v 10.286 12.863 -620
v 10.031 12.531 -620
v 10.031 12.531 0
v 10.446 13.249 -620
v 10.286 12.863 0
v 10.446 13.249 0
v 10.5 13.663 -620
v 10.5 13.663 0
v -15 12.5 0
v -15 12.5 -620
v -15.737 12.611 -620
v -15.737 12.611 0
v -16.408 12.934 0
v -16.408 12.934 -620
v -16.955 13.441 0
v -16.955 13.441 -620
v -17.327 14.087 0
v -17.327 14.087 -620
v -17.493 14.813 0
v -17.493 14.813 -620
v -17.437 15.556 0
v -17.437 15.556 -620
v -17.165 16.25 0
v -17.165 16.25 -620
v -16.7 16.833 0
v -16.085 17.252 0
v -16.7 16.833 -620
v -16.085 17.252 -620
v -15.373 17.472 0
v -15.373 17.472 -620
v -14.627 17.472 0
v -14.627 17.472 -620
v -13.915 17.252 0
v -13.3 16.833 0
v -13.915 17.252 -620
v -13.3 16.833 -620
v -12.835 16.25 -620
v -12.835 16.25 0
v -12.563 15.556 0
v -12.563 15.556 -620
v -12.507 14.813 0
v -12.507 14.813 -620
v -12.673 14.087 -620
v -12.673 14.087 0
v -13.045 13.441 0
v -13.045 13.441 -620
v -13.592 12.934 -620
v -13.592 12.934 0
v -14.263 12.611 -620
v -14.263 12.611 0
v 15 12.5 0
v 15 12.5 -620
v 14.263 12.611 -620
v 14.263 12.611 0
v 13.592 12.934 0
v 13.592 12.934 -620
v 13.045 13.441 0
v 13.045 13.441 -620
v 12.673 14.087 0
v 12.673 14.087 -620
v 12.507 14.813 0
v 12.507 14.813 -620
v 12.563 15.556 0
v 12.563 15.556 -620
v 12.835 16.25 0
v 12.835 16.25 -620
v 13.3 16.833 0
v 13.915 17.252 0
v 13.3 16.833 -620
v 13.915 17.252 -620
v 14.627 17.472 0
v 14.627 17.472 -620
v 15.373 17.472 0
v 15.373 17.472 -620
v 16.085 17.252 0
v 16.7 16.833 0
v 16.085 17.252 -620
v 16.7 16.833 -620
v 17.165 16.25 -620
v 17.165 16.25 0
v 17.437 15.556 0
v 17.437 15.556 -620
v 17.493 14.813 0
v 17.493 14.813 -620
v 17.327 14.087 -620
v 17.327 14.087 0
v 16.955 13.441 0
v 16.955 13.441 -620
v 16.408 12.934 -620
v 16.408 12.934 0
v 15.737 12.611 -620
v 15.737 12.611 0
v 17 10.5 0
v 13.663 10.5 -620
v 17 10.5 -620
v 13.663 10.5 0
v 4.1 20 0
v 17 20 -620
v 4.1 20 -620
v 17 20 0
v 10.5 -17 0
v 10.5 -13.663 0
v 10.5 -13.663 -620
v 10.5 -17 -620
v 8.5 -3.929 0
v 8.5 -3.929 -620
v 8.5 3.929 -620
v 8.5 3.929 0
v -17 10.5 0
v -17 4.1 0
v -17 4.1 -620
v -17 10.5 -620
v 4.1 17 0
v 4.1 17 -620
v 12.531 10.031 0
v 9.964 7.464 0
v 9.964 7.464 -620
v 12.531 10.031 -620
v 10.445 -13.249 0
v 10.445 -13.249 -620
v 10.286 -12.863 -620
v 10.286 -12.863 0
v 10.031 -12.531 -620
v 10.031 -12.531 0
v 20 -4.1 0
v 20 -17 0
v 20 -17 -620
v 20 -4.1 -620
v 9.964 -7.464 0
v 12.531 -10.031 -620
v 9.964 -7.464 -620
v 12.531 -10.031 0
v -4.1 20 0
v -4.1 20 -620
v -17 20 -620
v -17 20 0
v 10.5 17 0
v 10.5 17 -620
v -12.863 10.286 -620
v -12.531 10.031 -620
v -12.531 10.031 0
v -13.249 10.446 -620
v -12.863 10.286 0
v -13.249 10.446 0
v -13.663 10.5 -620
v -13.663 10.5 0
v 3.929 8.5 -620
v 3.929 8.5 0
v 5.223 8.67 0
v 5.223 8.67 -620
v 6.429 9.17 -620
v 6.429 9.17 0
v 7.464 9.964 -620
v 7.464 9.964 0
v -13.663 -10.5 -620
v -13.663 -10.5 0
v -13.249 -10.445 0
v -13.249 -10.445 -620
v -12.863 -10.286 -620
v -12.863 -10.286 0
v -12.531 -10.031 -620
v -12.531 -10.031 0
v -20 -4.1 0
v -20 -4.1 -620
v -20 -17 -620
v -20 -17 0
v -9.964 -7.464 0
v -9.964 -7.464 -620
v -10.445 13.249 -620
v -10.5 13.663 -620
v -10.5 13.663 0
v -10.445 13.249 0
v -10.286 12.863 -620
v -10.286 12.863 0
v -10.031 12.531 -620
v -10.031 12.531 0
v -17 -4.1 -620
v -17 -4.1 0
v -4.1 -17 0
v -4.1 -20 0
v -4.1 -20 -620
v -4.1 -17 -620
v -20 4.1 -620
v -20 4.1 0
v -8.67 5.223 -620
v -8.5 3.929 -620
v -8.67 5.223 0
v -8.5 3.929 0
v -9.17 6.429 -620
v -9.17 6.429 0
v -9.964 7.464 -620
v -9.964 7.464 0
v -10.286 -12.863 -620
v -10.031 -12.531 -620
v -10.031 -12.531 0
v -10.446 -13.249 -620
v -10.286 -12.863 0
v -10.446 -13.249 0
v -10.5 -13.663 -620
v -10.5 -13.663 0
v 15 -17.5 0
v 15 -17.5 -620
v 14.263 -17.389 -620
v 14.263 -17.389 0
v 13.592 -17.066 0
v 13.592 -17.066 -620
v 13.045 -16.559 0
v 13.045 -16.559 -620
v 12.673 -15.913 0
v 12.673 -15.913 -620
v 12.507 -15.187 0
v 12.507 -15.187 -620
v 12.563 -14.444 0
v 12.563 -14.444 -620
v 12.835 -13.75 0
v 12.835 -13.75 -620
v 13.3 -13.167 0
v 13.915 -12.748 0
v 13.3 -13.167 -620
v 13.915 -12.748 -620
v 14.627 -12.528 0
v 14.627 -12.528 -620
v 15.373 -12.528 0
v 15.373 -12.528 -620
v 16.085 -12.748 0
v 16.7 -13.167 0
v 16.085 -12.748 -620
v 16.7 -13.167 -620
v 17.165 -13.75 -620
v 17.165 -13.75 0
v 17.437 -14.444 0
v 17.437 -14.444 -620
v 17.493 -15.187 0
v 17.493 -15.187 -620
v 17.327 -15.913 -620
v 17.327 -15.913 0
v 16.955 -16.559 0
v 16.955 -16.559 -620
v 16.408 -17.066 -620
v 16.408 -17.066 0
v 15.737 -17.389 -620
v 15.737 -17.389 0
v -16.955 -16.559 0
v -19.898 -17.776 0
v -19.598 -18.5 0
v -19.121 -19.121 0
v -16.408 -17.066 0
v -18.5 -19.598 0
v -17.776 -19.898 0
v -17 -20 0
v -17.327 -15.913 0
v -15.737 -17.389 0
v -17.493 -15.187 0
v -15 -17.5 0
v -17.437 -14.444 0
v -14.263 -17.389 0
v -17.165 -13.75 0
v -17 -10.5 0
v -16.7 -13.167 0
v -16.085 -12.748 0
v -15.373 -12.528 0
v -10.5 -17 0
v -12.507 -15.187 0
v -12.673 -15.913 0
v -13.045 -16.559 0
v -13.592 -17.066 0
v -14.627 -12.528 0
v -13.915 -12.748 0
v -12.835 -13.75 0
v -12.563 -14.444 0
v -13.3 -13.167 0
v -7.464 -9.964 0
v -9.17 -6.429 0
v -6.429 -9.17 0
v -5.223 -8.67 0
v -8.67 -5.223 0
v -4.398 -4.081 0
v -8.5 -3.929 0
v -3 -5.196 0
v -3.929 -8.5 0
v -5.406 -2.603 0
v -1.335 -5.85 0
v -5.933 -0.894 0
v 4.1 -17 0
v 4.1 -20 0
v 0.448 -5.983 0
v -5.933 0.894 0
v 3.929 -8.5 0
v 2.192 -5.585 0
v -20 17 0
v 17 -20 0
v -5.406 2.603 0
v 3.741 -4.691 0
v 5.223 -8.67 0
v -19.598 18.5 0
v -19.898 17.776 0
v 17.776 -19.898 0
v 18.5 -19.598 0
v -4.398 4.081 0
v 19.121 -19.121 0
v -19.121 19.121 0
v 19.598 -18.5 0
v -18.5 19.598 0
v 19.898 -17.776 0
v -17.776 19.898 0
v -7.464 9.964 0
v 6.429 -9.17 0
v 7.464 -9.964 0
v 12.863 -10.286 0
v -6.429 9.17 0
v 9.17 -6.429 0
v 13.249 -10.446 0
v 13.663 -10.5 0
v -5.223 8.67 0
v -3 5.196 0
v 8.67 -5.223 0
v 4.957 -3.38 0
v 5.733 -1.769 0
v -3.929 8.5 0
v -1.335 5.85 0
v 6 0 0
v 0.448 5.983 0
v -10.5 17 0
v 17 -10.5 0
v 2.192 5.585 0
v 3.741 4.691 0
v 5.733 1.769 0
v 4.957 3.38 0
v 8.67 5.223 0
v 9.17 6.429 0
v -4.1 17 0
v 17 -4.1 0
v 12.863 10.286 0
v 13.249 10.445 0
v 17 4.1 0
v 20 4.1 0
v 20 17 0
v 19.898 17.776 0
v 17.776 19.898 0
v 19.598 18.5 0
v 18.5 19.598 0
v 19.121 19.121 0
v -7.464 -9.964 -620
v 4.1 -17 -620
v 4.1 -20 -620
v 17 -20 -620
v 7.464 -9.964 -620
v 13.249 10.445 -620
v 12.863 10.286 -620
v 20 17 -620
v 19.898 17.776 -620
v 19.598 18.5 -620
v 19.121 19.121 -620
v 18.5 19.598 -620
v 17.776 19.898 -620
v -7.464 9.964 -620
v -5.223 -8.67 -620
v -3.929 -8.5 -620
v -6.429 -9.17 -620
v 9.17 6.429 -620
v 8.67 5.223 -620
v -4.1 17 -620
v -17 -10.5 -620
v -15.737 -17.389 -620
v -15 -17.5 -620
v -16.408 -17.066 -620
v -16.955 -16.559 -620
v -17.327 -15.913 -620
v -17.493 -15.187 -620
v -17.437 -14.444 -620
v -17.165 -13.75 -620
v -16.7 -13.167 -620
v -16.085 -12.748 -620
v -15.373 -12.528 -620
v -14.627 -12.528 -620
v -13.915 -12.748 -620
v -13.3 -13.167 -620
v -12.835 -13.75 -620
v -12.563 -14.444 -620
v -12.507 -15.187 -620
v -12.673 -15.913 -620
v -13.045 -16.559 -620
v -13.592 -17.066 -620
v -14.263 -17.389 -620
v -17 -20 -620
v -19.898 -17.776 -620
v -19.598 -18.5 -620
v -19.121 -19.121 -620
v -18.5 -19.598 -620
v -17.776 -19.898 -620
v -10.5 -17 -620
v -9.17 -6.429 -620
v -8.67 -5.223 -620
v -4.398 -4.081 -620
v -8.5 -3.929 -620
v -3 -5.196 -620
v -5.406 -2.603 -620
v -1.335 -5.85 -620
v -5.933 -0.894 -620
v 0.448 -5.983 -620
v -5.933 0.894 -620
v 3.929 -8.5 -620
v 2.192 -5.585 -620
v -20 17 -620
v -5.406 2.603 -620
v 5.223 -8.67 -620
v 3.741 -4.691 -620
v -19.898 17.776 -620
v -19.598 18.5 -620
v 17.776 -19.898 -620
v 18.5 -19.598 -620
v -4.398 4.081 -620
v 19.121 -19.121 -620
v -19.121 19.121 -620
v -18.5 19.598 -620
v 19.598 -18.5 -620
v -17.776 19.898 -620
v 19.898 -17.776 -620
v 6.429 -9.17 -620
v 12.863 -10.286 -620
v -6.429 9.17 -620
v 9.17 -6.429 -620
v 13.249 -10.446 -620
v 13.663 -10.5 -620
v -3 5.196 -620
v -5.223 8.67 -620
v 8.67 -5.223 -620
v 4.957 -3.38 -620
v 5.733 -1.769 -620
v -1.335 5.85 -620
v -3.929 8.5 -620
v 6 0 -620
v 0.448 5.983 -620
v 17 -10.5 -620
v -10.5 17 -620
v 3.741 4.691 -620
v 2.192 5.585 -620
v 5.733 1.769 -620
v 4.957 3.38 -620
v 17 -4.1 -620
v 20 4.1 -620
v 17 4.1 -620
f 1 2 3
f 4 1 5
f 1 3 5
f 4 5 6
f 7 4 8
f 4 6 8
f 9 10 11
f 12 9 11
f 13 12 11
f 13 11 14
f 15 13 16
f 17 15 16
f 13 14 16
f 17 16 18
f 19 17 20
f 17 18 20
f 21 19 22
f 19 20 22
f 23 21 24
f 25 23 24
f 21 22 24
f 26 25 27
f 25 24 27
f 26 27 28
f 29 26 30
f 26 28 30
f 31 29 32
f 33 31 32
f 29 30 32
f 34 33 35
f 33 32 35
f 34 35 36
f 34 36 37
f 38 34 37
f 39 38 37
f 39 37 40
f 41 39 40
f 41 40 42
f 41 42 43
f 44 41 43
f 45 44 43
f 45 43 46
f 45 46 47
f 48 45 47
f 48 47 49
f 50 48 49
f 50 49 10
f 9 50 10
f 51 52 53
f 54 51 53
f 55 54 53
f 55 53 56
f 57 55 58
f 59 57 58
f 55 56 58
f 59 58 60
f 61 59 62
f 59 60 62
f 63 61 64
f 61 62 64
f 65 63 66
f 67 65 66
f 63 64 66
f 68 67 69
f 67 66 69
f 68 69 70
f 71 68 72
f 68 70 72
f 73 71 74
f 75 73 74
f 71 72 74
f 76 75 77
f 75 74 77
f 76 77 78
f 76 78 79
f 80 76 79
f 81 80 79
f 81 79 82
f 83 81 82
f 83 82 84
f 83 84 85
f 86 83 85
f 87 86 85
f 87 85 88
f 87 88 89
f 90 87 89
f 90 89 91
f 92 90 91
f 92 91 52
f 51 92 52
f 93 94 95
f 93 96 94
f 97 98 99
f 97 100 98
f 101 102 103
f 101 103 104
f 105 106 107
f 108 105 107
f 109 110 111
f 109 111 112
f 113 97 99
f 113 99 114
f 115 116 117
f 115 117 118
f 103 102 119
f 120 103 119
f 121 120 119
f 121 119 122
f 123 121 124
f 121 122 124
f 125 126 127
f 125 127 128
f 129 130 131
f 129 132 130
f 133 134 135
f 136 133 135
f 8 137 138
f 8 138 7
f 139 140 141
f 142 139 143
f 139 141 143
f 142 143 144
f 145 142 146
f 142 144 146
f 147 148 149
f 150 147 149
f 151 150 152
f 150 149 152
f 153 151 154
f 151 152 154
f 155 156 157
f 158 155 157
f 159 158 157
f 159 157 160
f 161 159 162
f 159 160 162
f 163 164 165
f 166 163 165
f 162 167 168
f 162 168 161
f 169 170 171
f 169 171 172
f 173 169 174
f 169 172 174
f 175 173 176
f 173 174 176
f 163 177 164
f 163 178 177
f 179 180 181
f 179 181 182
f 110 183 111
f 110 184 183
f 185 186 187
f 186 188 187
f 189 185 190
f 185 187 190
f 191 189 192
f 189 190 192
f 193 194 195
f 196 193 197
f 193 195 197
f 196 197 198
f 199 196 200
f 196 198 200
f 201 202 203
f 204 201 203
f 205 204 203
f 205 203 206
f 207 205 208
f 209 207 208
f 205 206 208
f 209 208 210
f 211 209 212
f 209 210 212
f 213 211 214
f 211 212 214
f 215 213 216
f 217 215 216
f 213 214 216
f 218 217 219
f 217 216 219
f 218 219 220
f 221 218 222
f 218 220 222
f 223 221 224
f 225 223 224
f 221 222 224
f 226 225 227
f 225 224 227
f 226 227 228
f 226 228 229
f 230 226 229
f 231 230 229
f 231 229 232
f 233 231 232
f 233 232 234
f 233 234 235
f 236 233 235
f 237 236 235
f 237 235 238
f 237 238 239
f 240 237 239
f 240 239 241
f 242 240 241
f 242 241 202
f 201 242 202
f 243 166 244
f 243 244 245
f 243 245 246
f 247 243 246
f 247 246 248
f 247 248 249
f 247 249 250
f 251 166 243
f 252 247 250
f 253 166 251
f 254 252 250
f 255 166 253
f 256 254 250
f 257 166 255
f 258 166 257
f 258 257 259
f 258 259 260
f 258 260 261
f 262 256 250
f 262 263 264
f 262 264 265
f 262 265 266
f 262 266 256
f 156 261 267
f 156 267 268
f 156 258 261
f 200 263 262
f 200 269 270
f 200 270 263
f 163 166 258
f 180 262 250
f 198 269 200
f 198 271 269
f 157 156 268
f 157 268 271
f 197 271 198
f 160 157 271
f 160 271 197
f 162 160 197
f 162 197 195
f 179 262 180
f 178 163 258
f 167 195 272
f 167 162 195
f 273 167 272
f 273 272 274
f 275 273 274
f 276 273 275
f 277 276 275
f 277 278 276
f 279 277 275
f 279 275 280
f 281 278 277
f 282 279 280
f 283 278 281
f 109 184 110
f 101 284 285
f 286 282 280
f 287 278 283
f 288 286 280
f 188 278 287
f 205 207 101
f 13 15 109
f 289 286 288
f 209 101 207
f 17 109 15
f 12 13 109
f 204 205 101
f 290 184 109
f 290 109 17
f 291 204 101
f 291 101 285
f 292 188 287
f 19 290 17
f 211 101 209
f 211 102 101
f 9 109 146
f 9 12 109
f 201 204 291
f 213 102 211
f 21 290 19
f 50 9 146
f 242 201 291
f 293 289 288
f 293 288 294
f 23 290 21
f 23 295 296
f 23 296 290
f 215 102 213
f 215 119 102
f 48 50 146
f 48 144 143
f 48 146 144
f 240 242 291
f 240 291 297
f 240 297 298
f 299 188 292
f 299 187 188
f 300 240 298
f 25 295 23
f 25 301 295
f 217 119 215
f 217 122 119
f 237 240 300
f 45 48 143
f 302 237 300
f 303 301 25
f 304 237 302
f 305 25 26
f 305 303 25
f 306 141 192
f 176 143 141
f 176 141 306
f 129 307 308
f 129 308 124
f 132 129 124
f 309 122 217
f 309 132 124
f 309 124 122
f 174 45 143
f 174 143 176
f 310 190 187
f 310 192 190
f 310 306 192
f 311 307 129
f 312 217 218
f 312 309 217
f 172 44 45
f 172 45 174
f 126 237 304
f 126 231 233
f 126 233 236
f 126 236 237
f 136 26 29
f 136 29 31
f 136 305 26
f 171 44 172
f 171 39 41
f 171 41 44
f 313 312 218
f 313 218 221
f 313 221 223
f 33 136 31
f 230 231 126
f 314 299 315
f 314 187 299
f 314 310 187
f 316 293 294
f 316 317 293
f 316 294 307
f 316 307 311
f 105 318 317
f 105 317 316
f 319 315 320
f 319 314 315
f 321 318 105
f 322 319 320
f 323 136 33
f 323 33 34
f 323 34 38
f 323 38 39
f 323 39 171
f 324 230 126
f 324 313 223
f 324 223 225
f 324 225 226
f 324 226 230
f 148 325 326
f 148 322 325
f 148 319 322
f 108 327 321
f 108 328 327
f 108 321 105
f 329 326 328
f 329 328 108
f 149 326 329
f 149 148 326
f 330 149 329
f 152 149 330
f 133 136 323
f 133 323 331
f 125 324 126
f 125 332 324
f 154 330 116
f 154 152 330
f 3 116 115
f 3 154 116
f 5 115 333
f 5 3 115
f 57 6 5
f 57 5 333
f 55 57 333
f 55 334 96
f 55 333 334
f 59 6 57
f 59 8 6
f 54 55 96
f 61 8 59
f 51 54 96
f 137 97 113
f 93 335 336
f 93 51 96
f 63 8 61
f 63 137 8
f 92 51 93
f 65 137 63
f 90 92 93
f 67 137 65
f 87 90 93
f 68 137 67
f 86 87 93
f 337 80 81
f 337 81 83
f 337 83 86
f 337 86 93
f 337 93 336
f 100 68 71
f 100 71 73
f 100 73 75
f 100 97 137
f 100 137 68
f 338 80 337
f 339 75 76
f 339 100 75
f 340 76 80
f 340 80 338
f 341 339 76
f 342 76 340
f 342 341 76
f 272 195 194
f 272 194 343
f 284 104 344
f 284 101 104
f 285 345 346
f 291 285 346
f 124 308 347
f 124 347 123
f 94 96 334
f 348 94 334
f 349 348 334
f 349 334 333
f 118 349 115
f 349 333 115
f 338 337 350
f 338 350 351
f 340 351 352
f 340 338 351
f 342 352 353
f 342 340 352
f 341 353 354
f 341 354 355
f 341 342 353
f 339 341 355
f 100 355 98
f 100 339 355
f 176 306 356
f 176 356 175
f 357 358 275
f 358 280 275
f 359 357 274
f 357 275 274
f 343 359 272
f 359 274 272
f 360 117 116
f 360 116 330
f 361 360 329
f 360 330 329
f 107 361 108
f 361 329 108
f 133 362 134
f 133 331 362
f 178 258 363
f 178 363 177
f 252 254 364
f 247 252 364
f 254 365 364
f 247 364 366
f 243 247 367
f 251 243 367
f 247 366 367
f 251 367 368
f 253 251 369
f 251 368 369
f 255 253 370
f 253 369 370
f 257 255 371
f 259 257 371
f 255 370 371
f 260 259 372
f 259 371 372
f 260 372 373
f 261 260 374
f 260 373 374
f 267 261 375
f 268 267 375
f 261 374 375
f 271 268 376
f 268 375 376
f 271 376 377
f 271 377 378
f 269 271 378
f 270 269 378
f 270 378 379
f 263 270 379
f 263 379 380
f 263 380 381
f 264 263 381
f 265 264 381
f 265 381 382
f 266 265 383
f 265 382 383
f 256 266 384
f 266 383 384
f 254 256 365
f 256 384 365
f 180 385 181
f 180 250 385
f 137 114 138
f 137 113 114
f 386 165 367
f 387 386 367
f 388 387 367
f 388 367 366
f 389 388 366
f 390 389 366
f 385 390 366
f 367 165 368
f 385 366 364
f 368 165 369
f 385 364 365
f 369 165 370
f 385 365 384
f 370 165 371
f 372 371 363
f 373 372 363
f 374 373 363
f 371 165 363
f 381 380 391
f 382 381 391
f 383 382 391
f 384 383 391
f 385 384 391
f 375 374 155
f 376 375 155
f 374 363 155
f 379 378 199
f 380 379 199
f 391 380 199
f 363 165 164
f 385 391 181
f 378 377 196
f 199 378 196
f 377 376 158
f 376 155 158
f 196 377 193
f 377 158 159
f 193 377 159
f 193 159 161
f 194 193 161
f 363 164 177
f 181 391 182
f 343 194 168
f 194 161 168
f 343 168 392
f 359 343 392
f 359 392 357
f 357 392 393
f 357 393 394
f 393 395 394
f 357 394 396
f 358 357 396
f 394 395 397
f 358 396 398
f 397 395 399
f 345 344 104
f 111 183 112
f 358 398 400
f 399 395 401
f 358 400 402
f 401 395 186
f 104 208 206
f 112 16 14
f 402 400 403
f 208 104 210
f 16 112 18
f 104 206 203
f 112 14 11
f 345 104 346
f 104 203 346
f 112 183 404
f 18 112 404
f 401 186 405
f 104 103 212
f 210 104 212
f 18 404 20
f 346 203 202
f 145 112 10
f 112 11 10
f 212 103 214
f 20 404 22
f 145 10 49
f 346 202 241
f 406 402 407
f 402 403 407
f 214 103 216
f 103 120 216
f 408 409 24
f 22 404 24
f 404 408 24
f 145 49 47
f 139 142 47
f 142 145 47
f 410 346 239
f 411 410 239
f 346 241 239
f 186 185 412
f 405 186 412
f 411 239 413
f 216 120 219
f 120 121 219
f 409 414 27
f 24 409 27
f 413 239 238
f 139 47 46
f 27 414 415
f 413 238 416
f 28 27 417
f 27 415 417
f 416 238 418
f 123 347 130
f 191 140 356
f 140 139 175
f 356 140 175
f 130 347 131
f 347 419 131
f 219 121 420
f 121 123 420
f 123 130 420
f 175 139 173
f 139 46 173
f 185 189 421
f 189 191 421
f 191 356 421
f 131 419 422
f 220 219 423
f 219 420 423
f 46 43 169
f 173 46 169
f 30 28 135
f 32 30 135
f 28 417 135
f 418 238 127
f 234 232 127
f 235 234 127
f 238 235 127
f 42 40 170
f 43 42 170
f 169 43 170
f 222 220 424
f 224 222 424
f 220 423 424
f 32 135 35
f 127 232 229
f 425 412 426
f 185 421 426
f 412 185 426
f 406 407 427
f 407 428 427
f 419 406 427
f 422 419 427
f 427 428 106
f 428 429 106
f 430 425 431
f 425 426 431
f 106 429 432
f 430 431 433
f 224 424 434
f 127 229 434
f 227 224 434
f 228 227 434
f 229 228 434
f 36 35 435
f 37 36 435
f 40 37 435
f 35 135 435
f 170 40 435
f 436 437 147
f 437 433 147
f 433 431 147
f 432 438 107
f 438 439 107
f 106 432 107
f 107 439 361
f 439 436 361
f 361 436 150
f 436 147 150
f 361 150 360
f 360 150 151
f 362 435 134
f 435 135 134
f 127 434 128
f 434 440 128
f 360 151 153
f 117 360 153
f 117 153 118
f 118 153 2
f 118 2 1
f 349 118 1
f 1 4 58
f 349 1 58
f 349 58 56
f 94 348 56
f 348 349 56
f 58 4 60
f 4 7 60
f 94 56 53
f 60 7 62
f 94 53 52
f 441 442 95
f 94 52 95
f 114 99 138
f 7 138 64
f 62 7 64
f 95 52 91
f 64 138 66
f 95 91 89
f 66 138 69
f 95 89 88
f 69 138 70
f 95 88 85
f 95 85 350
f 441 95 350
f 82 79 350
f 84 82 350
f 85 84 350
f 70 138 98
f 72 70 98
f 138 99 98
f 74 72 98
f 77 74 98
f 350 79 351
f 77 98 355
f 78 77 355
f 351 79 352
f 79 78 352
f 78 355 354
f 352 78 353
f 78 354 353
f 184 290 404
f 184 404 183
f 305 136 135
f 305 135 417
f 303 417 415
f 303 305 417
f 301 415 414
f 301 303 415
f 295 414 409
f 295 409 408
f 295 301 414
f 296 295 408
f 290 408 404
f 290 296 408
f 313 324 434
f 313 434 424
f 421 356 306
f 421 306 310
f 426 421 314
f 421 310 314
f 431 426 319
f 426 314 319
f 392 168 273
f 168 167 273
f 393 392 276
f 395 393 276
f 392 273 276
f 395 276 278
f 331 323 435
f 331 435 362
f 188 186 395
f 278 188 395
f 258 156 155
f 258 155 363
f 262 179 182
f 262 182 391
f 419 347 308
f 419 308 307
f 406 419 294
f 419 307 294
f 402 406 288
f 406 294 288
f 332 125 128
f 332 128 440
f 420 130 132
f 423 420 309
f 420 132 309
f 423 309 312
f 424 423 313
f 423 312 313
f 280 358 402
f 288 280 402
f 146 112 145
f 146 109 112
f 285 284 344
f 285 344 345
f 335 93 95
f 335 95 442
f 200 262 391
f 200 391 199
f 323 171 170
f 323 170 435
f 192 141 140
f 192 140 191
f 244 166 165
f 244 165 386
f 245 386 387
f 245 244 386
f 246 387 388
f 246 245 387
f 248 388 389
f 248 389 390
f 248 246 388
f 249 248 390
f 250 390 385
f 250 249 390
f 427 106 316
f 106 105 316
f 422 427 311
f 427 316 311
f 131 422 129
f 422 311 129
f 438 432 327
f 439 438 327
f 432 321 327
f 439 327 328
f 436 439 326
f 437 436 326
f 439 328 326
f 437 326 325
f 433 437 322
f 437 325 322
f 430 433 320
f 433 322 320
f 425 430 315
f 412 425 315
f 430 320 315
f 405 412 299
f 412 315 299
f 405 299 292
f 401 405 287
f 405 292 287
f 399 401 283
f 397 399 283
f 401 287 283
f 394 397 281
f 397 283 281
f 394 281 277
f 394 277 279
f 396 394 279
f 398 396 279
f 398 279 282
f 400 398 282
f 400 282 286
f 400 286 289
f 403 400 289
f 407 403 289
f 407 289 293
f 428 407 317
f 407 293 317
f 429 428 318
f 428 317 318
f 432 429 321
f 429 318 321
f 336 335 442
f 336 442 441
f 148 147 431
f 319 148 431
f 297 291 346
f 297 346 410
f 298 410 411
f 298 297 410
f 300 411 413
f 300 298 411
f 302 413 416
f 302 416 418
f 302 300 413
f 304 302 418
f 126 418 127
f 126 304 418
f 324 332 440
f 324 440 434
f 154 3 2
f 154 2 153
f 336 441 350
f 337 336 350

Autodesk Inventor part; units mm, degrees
sketch "Skizze_1" plane through (0, 0, 0) normal (0, 0, 1) x (1, 0, 0)
  arc A0 (-20, -17) -> (-17, -20) centre (-17, -17) ccw
  line L0 (-17, -20) -> (-4.1, -20)
  line L1 (-4.1, -20) -> (-4.1, -17)
  line L2 (-4.1, -17) -> (-10.5, -17)
  line L3 (-10.5, -17) -> (-10.5, -13.6627)
  arc A1 (-10.0314, -12.5314) -> (-10.5, -13.6627) centre (-8.9002, -13.6627) ccw
  line L4 (-10.0314, -12.5314) -> (-7.4645, -9.9645)
  arc A2 (-3.9289, -8.5) -> (-7.4645, -9.9645) centre (-3.9289, -13.5) ccw
  line L5 (-3.9289, -8.5) -> (3.9289, -8.5)
  arc A3 (7.4645, -9.9645) -> (3.9289, -8.5) centre (3.9289, -13.5) ccw
  line L6 (7.4645, -9.9645) -> (10.0314, -12.5314)
  arc A4 (10.5, -13.6627) -> (10.0314, -12.5314) centre (8.9002, -13.6627) ccw
  line L7 (10.5, -13.6627) -> (10.5, -17)
  line L8 (10.5, -17) -> (4.1, -17)
  line L9 (4.1, -17) -> (4.1, -20)
  line L10 (4.1, -20) -> (17, -20)
  arc A5 (17, -20) -> (20, -17) centre (17, -17) ccw
  line L11 (20, -17) -> (20, -4.1)
  line L12 (20, -4.1) -> (17, -4.1)
  line L13 (17, -4.1) -> (17, -10.5)
  line L14 (17, -10.5) -> (13.6627, -10.5)
  arc A6 (12.5314, -10.0314) -> (13.6627, -10.5) centre (13.6627, -8.9002) ccw
  line L15 (12.5314, -10.0314) -> (9.9645, -7.4645)
  arc A7 (8.5, -3.9289) -> (9.9645, -7.4645) centre (13.5, -3.9289) ccw
  line L16 (8.5, -3.9289) -> (8.5, 3.9289)
  arc A8 (9.9645, 7.4645) -> (8.5, 3.9289) centre (13.5, 3.9289) ccw
  line L17 (9.9645, 7.4645) -> (12.5314, 10.0314)
  arc A9 (13.6627, 10.5) -> (12.5314, 10.0314) centre (13.6627, 8.9002) ccw
  line L18 (13.6627, 10.5) -> (17, 10.5)
  line L19 (17, 10.5) -> (17, 4.1)
  line L20 (17, 4.1) -> (20, 4.1)
  line L21 (20, 4.1) -> (20, 17)
  arc A10 (20, 17) -> (17, 20) centre (17, 17) ccw
  line L22 (17, 20) -> (4.1, 20)
  line L23 (4.1, 20) -> (4.1, 17)
  line L24 (4.1, 17) -> (10.5, 17)
  line L25 (10.5, 17) -> (10.5, 13.6627)
  arc A11 (10.0314, 12.5314) -> (10.5, 13.6627) centre (8.9002, 13.6627) ccw
  line L26 (10.0314, 12.5314) -> (7.4645, 9.9645)
  arc A12 (3.9289, 8.5) -> (7.4645, 9.9645) centre (3.9289, 13.5) ccw
  line L27 (3.9289, 8.5) -> (-3.9289, 8.5)
  arc A13 (-7.4645, 9.9645) -> (-3.9289, 8.5) centre (-3.9289, 13.5) ccw
  line L28 (-7.4645, 9.9645) -> (-10.0314, 12.5314)
  arc A14 (-10.5, 13.6627) -> (-10.0314, 12.5314) centre (-8.9002, 13.6627) ccw
  line L29 (-10.5, 13.6627) -> (-10.5, 17)
  line L30 (-10.5, 17) -> (-4.1, 17)
  line L31 (-4.1, 17) -> (-4.1, 20)
  line L32 (-4.1, 20) -> (-17, 20)
  arc A15 (-17, 20) -> (-20, 17) centre (-17, 17) ccw
  line L33 (-20, 17) -> (-20, 4.1)
  line L34 (-20, 4.1) -> (-17, 4.1)
  line L35 (-17, 4.1) -> (-17, 10.5)
  line L36 (-17, 10.5) -> (-13.6627, 10.5)
  arc A16 (-12.5314, 10.0314) -> (-13.6627, 10.5) centre (-13.6627, 8.9002) ccw
  line L37 (-12.5314, 10.0314) -> (-9.9645, 7.4645)
  arc A17 (-8.5, 3.9289) -> (-9.9645, 7.4645) centre (-13.5, 3.9289) ccw
  line L38 (-8.5, 3.9289) -> (-8.5, -3.9289)
  arc A18 (-9.9645, -7.4645) -> (-8.5, -3.9289) centre (-13.5, -3.9289) ccw
  line L39 (-9.9645, -7.4645) -> (-12.5314, -10.0314)
  arc A19 (-13.6627, -10.5) -> (-12.5314, -10.0314) centre (-13.6627, -8.9002) ccw
  line L40 (-13.6627, -10.5) -> (-17, -10.5)
  line L41 (-17, -10.5) -> (-17, -4.1)
  line L42 (-17, -4.1) -> (-20, -4.1)
  line L43 (-20, -4.1) -> (-20, -17)
  circle A20 centre (0, 0) radius 6
extrude "Extrusion1" add sketch "Skizze_1" against normal blind 620
sketch "Sketch2" plane through (0, 0, 0) normal (0, 0, 1) x (1, 0, 0)
  point P0 (-15, -15)
hole "Drilling 1" at (-15, -15, 0) direction (0, 0, -1) diameter 5 depth 6000
sketch "Sketch3" plane through (0, 0, 0) normal (0, 0, 1) x (1, 0, 0)
  point P0 (15, -15)
hole "Drilling 2" at (15, -15, 0) direction (0, 0, -1) diameter 5 depth 6000
sketch "Sketch4" plane through (0, 0, 0) normal (0, 0, 1) x (1, 0, 0)
  point P0 (15, 15)
hole "Drilling 3" at (15, 15, 0) direction (0, 0, -1) diameter 5 depth 6000
sketch "Sketch5" plane through (0, 0, 0) normal (0, 0, 1) x (1, 0, 0)
  point P0 (-15, 15)
hole "Drilling 4" at (-15, 15, 0) direction (0, 0, -1) diameter 5 depth 6000
ref_plane "side_4d_XY" through (-20, 0, -310) normal (-1, 0, 0) x (0, 1, 0)
ref_plane "side_4d_YZ" through (-20, 0, -310) normal (0, 1, 0) x (0, 0, -1)
ref_plane "side_4d_ZX" through (-20, 0, -310) normal (0, 0, -1) x (-1, 0, 0)
ref_plane "side_1a_XY" through (0, 20, -310) normal (0, 1, 0) x (1, 0, 0)
ref_plane "side_1a_YZ" through (0, 20, -310) normal (1, 0, 0) x (0, 0, -1)
ref_plane "side_1a_ZX" through (0, 20, -310) normal (0, 0, -1) x (0, 1, 0)
ref_plane "side_2b_XY" through (20, 0, -310) normal (1, 0, 0) x (0, -1, 0)
ref_plane "side_2b_YZ" through (20, 0, -310) normal (0, -1, 0) x (0, 0, -1)
ref_plane "side_2b_ZX" through (20, 0, -310) normal (0, 0, -1) x (1, 0, 0)
ref_plane "side_3c_XY" through (0, -20, -310) normal (0, -1, 0) x (-1, 0, 0)
ref_plane "side_3c_YZ" through (0, -20, -310) normal (-1, 0, 0) x (0, 0, -1)
ref_plane "side_3c_ZX" through (0, -20, -310) normal (0, 0, -1) x (0, -1, 0)
ref_plane "end_XY" through (0, 0, -620) normal (0, 0, -1) x (1, 0, 0)
ref_plane "end_YZ" through (0, 0, -620) normal (1, 0, 0) x (0, -1, 0)
ref_plane "end_ZX" through (0, 0, -620) normal (0, -1, 0) x (0, 0, -1)
ref_plane "start_XY" through (0, 0, 0) normal (0, 0, 1) x (1, 0, 0)
ref_plane "start_YZ" through (0, 0, 0) normal (1, 0, 0) x (0, 1, 0)
ref_plane "start_ZX" through (0, 0, 0) normal (0, 1, 0) x (0, 0, 1)
properties part number "MayTec 1.11.040040.43S_Profile 40x40, 4E, S_620_Detail_(0;0,0,0)"
